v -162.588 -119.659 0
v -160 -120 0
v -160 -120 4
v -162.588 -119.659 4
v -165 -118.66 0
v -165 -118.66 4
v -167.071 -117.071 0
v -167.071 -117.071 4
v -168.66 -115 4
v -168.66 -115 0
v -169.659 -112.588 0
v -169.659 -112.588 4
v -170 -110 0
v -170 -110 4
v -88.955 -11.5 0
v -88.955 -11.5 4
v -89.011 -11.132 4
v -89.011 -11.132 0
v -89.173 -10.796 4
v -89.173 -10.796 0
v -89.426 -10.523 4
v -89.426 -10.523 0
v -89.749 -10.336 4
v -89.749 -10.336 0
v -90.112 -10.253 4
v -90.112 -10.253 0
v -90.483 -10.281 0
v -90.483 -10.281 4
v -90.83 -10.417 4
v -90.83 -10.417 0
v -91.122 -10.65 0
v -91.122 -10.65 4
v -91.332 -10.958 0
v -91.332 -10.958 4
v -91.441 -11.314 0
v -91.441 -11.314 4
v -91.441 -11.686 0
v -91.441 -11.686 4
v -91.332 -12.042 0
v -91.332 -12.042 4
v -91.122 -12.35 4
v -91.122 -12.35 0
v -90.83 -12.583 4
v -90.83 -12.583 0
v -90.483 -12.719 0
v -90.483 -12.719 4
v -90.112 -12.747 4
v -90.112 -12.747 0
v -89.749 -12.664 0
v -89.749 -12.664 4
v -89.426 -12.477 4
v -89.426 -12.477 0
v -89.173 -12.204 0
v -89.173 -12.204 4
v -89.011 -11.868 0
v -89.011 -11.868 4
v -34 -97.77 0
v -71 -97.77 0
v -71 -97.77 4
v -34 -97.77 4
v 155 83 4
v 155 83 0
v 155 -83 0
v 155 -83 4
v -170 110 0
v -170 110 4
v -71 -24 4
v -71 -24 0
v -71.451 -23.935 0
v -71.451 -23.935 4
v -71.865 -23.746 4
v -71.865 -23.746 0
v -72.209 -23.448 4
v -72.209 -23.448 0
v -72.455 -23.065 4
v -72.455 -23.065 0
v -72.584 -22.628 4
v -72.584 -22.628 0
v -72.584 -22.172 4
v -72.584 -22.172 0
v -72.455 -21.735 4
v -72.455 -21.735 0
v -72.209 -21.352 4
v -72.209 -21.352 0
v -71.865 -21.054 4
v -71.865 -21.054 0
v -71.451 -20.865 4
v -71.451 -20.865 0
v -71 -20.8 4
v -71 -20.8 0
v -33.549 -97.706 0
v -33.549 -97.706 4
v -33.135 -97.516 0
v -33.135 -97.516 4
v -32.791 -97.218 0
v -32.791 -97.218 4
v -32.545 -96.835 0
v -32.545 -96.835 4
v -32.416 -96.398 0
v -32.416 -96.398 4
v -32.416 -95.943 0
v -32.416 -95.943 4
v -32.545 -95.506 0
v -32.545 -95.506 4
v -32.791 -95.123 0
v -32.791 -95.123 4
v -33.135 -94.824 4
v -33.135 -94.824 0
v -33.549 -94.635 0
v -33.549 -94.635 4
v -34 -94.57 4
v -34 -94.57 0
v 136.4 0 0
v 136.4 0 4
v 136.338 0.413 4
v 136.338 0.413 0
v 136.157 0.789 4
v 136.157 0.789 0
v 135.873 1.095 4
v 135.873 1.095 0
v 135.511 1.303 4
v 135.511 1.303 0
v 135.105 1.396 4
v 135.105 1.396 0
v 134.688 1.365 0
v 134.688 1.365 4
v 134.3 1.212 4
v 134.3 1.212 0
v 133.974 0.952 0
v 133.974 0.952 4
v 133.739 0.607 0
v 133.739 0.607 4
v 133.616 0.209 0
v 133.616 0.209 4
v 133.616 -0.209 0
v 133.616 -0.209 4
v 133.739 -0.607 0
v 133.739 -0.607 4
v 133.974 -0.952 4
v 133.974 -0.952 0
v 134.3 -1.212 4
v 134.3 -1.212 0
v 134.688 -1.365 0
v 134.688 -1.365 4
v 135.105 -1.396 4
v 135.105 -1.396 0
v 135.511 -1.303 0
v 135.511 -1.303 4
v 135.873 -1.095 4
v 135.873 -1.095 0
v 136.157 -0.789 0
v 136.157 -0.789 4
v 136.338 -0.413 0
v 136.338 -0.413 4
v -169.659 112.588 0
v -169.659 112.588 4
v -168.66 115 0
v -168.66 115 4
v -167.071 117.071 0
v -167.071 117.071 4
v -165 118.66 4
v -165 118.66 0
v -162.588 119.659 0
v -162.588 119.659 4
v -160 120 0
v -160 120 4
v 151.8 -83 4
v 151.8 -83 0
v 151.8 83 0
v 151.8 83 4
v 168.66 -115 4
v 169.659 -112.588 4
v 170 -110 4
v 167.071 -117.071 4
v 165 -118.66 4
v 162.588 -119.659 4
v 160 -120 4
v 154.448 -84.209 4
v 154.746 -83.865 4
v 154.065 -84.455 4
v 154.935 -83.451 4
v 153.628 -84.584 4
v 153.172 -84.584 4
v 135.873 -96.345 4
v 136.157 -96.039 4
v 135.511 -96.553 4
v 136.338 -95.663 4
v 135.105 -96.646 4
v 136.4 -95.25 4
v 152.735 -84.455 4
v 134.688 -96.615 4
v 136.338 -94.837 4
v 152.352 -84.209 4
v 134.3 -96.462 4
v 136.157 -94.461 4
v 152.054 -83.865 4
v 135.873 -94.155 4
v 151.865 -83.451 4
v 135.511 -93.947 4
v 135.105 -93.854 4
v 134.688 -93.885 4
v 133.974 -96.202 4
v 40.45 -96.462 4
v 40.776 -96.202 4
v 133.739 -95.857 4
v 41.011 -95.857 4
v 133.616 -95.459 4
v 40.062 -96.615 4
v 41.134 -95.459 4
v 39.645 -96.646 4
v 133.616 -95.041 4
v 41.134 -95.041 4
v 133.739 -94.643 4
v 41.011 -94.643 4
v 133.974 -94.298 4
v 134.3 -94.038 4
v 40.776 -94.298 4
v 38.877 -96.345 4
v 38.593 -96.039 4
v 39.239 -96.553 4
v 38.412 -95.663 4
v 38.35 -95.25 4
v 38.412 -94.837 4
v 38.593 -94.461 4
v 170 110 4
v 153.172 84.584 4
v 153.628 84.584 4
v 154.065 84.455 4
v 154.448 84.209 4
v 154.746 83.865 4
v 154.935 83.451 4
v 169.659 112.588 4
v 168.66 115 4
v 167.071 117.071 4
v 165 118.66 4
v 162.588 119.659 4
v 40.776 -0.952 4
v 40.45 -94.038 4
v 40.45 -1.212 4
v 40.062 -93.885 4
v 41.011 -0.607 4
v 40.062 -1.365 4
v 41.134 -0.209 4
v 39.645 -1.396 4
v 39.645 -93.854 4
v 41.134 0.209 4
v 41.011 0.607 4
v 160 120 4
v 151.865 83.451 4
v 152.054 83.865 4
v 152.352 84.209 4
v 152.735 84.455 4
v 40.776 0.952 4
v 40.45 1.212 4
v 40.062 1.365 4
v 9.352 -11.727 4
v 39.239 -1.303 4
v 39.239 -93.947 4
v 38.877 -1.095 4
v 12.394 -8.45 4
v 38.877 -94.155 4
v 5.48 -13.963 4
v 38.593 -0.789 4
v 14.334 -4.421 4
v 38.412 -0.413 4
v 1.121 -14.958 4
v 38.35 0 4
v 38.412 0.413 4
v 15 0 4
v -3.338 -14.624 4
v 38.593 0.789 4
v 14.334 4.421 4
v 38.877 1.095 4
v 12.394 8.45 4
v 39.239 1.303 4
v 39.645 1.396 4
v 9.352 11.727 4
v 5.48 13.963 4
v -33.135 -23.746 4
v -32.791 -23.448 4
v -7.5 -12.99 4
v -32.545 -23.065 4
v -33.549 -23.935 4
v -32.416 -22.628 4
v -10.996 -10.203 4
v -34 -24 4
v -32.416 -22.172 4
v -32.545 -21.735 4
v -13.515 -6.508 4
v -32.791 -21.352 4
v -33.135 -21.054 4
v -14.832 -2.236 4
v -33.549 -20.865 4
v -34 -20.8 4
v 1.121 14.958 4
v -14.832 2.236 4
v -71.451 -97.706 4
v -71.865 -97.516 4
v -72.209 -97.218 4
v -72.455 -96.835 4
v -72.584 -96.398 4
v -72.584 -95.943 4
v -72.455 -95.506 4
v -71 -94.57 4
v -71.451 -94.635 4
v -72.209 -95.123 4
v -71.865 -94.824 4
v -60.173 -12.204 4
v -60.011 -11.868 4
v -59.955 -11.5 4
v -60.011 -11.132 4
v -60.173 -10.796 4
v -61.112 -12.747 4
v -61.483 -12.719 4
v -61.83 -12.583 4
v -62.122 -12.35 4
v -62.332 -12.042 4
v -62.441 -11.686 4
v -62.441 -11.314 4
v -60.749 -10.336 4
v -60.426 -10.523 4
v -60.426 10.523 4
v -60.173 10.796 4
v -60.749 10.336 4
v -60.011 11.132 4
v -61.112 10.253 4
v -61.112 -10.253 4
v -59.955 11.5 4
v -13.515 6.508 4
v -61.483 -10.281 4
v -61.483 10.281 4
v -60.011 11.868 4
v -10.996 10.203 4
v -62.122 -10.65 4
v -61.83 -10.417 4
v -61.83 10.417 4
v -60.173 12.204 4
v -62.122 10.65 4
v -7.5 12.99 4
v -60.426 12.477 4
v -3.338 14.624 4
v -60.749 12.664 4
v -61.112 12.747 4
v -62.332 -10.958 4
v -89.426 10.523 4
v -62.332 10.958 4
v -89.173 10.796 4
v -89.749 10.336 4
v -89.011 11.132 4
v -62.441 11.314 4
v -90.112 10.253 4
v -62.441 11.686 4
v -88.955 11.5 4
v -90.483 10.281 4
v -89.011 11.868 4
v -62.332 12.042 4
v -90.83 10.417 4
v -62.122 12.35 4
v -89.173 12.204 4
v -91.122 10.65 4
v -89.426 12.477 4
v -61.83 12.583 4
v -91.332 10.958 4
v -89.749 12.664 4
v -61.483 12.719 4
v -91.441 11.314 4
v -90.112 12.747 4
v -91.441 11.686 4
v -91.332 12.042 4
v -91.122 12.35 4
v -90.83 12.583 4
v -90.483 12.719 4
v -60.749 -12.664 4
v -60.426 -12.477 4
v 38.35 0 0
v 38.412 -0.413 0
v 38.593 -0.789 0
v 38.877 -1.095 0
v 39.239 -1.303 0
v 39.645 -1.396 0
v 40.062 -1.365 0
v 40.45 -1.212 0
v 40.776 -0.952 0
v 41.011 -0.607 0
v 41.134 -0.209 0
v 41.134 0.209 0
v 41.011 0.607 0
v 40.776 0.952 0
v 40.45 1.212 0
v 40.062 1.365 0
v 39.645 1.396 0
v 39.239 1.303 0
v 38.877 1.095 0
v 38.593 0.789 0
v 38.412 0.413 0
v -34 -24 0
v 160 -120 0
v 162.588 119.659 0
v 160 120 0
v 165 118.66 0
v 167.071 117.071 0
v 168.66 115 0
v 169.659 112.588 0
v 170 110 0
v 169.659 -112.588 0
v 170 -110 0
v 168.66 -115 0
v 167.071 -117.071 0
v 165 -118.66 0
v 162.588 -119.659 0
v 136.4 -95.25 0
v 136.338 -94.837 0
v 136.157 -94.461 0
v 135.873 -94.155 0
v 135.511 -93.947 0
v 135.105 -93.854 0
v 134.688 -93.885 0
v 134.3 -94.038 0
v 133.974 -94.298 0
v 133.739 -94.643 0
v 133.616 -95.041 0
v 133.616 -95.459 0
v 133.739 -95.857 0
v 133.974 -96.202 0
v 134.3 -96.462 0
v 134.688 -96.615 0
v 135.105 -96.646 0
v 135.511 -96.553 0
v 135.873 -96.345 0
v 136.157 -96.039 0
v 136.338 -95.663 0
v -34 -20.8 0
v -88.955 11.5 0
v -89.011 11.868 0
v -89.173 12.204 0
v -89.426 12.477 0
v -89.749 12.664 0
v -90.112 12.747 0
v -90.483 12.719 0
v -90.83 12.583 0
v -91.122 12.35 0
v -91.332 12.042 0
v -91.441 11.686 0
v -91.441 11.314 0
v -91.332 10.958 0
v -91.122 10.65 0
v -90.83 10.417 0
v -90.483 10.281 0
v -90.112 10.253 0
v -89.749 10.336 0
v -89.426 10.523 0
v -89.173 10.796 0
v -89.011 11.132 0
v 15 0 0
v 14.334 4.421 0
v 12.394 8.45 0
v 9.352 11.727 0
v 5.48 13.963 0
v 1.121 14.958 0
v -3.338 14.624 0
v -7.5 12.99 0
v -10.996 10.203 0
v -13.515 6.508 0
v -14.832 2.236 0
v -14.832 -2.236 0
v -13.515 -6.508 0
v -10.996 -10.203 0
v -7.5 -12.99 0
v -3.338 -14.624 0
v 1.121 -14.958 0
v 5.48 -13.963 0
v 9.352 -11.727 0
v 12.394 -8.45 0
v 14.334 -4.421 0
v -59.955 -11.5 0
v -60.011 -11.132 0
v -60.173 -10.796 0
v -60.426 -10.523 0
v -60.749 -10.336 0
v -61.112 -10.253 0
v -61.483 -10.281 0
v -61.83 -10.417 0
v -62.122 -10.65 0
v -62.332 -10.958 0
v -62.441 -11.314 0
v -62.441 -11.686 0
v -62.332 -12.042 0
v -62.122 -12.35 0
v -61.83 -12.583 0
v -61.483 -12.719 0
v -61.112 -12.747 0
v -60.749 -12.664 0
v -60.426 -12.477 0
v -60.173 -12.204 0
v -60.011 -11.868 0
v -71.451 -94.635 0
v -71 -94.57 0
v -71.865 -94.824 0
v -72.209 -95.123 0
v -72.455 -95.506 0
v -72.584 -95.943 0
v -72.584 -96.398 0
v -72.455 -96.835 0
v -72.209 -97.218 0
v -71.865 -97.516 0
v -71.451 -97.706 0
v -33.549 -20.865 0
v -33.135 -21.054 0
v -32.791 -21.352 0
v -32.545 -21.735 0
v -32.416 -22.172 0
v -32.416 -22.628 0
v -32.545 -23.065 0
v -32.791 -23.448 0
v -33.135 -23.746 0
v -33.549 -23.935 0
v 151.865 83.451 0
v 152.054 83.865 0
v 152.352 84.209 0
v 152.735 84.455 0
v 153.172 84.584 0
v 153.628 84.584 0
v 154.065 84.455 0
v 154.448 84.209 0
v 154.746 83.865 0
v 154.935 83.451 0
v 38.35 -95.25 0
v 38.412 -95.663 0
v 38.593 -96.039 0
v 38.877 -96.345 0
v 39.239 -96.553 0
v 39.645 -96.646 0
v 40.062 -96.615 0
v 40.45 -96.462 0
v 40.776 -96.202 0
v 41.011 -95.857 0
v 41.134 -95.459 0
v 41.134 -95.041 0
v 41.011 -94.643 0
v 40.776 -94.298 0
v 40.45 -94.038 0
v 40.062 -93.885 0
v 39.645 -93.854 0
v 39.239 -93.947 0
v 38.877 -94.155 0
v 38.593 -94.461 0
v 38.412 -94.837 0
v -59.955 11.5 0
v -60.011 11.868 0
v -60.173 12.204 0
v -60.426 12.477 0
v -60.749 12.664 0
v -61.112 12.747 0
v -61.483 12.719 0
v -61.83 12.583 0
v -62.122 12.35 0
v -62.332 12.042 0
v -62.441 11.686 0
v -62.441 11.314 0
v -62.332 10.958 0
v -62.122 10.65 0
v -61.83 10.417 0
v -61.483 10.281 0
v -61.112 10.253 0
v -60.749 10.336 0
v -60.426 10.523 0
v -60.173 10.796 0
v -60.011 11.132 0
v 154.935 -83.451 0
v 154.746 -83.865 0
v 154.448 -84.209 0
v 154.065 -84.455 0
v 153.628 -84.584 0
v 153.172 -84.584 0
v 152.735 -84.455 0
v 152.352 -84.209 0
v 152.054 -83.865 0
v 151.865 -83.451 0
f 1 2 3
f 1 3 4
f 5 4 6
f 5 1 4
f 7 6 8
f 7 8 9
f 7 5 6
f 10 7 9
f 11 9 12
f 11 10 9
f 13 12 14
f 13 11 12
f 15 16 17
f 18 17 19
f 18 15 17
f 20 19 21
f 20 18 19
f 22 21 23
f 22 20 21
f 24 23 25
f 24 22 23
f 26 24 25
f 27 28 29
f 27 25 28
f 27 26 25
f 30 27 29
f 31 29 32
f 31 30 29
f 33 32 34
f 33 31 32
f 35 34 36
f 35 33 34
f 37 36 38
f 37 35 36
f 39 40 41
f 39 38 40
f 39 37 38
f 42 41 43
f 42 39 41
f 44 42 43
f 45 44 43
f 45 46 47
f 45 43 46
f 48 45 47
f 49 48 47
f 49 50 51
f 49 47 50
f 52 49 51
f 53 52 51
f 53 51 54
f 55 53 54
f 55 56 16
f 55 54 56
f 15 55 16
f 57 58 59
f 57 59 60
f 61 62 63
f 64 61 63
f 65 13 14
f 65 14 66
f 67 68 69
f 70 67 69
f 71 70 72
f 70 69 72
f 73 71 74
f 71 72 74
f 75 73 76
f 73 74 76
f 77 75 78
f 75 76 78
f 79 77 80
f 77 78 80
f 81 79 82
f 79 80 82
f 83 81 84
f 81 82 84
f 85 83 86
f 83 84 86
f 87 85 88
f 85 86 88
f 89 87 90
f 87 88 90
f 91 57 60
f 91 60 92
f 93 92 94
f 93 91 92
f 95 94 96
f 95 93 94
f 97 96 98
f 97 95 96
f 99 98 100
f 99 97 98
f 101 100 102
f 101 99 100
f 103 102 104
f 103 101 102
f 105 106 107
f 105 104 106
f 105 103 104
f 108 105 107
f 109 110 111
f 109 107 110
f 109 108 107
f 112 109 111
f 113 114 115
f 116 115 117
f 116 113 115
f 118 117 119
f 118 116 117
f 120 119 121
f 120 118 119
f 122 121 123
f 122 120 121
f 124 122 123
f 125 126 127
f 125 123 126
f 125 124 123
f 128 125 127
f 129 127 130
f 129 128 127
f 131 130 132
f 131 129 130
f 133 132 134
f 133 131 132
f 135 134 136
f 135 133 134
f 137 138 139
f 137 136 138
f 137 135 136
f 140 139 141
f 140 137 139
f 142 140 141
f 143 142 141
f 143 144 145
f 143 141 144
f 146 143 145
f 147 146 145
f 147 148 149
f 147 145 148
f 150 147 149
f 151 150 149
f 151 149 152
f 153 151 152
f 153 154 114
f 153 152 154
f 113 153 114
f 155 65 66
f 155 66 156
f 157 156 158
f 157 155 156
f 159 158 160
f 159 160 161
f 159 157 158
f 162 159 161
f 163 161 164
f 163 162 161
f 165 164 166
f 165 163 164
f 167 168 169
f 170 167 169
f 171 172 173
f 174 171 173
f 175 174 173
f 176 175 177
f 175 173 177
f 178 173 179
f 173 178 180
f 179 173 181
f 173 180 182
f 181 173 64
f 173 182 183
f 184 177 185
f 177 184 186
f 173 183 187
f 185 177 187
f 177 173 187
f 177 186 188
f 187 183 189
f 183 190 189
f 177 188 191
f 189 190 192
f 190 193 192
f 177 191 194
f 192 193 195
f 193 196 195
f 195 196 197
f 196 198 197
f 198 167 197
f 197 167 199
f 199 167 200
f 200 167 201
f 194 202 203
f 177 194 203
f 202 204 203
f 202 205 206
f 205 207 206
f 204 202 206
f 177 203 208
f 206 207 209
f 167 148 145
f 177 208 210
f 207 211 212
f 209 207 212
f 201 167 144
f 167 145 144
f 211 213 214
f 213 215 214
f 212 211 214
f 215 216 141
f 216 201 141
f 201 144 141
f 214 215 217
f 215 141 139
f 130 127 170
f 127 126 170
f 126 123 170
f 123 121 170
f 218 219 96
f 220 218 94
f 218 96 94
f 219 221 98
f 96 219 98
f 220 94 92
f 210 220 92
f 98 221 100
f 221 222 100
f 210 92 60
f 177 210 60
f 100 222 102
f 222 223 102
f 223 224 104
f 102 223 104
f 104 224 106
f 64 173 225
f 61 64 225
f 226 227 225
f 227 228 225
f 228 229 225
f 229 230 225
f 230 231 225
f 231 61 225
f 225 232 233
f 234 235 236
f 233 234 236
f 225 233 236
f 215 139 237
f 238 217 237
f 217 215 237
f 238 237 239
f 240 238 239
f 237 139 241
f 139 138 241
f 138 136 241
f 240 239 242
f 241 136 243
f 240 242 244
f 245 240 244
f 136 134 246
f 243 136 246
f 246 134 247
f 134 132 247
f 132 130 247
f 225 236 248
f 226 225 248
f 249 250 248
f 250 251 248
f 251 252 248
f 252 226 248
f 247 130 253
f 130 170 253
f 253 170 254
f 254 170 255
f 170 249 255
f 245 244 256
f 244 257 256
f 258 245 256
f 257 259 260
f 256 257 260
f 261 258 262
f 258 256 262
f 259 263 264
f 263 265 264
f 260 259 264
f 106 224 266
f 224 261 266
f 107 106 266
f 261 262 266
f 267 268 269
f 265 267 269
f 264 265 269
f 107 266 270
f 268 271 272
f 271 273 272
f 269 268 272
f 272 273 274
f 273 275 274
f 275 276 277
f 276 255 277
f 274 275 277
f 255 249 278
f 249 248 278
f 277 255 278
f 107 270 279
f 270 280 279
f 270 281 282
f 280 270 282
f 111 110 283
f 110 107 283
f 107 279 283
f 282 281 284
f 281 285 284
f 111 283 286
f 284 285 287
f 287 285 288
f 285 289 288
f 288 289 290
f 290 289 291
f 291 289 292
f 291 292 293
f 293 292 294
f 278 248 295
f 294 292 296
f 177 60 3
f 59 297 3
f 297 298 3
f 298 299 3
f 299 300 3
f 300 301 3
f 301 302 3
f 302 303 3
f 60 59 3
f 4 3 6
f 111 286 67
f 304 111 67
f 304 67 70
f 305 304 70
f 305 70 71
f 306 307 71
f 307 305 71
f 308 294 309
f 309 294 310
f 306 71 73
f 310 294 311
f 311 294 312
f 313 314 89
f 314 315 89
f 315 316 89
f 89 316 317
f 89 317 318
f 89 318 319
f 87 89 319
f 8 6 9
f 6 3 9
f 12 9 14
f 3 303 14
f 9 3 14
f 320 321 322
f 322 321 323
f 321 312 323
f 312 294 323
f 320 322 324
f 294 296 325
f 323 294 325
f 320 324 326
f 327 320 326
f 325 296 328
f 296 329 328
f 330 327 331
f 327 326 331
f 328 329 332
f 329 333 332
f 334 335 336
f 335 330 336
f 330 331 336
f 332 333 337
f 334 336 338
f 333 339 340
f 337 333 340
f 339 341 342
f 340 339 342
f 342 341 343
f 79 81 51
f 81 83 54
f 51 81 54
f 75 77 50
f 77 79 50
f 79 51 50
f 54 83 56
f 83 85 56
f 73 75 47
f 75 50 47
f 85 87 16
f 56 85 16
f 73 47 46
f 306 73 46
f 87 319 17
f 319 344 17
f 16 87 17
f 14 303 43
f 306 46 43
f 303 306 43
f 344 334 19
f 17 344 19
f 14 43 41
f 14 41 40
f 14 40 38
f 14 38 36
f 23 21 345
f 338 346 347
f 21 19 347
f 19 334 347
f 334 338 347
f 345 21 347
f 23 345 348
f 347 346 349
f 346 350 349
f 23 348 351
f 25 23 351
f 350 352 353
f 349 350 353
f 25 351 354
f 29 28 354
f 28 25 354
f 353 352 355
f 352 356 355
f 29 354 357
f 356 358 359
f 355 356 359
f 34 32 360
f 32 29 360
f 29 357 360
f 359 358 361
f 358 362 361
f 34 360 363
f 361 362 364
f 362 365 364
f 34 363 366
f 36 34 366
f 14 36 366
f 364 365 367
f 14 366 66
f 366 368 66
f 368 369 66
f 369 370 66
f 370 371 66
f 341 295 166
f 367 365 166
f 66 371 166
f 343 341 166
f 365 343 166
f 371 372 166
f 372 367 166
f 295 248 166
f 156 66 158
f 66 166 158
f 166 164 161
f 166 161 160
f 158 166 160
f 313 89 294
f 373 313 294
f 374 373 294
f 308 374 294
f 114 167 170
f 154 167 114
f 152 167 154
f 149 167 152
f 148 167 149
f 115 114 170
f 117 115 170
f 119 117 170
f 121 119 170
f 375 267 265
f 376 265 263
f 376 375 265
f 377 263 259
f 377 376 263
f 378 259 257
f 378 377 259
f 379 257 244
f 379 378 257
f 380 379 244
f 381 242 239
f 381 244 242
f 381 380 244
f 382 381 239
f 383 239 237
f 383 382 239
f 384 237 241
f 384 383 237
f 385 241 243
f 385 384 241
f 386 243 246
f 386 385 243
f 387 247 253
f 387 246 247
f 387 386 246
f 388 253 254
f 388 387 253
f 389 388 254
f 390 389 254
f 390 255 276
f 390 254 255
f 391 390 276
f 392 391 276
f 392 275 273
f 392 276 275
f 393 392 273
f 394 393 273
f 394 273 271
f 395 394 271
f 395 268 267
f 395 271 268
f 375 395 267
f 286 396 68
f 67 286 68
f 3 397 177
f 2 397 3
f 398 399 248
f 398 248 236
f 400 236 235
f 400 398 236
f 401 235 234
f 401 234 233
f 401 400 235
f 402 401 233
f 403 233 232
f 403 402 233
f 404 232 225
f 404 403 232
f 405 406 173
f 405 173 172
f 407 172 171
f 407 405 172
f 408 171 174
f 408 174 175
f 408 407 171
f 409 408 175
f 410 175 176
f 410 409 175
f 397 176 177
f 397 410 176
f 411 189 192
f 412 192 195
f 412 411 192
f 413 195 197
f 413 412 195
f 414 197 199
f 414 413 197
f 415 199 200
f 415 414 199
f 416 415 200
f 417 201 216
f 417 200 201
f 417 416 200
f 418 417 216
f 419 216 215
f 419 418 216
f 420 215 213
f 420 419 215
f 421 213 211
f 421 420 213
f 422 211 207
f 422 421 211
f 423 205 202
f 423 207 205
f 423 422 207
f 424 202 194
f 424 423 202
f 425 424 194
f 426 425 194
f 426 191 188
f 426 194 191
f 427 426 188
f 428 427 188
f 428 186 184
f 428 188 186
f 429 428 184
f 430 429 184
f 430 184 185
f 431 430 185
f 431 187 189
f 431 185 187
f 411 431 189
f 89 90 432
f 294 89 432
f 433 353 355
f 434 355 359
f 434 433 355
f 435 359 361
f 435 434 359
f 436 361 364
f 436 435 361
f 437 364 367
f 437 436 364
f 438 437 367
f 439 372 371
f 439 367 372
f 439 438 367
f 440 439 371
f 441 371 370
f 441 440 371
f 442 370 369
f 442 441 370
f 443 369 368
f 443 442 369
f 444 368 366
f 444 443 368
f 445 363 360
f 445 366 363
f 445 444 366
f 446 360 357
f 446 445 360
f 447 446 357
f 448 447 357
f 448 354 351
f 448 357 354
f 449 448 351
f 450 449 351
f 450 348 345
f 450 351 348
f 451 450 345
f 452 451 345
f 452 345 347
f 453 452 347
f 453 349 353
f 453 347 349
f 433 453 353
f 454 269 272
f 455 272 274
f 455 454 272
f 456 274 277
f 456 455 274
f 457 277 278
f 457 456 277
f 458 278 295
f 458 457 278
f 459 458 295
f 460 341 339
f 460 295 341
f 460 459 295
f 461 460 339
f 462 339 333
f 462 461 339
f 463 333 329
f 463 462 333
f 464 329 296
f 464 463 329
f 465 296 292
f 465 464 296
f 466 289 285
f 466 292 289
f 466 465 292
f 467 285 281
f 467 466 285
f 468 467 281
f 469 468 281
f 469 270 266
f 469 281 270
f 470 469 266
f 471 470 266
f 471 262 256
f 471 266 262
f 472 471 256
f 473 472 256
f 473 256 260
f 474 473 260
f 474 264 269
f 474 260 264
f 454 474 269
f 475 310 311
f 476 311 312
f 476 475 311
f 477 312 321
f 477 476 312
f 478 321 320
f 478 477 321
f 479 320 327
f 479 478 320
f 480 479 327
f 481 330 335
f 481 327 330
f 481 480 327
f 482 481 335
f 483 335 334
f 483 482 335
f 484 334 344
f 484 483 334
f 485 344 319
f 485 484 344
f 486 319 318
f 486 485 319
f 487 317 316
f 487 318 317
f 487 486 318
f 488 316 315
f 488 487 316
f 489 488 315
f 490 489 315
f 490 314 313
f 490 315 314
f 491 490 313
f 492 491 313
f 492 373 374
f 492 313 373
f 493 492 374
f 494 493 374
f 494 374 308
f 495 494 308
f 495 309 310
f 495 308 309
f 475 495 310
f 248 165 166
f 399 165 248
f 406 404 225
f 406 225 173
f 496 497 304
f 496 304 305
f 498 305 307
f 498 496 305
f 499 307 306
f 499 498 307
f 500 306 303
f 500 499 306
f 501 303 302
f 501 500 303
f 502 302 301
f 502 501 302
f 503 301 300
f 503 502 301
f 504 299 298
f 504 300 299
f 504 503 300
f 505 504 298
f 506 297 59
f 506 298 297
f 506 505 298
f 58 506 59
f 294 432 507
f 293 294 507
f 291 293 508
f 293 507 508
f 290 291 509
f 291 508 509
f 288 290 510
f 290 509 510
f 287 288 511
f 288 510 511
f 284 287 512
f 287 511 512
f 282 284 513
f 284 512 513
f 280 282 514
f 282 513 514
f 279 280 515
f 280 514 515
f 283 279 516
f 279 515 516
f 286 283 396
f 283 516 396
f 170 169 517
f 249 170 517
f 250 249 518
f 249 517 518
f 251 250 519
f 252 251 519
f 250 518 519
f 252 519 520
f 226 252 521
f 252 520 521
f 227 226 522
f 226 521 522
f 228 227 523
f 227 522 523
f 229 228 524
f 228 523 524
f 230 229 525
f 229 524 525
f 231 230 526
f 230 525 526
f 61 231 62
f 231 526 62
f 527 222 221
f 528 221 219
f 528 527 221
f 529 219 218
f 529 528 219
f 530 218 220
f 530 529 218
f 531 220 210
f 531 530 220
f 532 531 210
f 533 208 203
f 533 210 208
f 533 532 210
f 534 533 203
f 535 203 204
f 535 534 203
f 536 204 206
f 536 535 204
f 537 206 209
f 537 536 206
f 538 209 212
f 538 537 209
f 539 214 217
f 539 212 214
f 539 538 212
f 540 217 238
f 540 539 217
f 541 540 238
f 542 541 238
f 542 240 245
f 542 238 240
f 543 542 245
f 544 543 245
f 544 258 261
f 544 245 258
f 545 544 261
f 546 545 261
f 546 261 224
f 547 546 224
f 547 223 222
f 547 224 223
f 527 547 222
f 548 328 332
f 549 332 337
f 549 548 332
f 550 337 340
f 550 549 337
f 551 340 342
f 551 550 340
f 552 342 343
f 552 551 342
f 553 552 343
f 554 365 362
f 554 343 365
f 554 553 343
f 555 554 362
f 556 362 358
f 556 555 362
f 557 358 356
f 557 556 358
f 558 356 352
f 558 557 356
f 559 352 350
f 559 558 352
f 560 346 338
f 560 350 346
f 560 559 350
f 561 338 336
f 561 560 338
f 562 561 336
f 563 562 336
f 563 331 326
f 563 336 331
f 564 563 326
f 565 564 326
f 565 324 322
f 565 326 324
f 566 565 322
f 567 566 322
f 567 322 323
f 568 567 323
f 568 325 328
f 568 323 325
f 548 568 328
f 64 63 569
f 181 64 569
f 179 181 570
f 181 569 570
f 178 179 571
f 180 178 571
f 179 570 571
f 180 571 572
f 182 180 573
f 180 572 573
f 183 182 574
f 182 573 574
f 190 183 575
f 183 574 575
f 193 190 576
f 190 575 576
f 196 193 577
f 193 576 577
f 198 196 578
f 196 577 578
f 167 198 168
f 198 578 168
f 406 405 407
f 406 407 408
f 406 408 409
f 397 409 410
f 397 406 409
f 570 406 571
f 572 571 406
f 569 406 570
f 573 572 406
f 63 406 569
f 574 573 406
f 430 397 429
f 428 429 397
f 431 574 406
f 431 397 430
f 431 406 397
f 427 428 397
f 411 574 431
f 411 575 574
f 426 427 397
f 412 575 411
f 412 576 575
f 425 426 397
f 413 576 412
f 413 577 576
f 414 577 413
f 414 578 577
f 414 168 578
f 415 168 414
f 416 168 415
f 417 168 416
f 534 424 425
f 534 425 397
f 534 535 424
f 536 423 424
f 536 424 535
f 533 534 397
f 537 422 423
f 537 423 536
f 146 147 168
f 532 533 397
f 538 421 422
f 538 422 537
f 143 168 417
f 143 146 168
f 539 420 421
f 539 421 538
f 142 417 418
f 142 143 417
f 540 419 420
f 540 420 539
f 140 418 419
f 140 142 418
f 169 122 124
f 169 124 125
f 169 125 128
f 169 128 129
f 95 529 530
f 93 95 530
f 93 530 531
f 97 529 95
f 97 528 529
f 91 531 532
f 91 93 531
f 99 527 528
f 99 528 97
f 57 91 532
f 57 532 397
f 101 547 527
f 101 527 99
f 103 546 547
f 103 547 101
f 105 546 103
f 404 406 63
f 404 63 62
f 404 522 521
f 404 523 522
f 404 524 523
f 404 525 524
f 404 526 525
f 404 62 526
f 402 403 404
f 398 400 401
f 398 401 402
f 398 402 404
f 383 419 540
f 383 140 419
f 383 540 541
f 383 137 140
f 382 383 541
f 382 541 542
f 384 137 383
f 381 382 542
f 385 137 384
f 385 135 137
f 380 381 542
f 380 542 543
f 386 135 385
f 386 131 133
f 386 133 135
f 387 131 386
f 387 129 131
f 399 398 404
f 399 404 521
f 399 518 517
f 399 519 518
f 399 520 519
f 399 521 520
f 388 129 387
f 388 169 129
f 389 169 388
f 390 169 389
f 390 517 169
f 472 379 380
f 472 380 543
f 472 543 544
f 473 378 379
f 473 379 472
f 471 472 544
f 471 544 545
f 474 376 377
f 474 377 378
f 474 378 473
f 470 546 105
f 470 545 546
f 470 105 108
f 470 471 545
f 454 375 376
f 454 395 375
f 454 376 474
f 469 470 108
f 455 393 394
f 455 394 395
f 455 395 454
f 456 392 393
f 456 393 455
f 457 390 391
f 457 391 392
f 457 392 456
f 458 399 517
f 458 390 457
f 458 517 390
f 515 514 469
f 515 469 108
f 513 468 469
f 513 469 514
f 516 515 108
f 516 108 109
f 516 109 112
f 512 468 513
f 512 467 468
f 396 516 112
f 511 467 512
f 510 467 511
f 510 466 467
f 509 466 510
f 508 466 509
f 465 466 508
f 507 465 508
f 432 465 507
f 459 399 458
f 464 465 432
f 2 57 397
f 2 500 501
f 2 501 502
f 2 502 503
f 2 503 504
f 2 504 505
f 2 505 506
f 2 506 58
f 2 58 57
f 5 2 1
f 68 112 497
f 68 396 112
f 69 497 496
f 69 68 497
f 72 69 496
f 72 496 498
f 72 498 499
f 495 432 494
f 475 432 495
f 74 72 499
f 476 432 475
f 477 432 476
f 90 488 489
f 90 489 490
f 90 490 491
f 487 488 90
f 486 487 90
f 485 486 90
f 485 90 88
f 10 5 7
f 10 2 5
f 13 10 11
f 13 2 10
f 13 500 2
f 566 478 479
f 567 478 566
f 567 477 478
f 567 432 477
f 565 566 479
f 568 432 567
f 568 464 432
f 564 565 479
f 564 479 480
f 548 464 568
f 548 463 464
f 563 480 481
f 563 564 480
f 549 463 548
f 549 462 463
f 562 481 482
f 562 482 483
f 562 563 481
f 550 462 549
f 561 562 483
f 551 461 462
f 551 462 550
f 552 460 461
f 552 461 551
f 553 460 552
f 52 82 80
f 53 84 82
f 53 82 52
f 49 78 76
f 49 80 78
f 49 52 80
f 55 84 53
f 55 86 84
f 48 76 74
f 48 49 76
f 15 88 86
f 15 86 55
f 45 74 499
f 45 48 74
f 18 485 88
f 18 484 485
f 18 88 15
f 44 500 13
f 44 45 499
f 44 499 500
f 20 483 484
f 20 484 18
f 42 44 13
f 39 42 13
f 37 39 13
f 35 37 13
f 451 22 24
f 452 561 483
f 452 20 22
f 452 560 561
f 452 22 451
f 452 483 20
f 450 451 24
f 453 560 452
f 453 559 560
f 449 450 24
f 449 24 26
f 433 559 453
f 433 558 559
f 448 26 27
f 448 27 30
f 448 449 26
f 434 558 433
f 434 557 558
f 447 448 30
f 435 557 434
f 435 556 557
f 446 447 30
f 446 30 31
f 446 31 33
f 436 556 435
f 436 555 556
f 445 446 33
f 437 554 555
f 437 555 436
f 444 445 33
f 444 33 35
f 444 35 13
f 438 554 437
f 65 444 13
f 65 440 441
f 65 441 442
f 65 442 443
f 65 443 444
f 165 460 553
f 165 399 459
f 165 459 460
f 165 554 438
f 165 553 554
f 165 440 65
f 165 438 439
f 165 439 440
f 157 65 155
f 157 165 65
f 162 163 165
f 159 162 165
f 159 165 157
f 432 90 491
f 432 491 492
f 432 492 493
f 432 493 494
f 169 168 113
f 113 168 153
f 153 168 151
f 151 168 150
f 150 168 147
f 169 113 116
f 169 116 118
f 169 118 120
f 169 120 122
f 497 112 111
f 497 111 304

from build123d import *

# Parameters (mm, degrees)
EXTRUDE_1_DEPTH             = 4
SKETCH_1_4_R                = 1.25
CUT_EXTRUDE_4_DEPTH         = 10
PATTERN_LINEAR_1_COUNT      = 2
PATTERN_LINEAR_1_PITCH      = 29
PATTERN_LINEAR_1_COUNT_DIR2 = 2
PATTERN_LINEAR_1_PITCH_DIR2 = 23
CUT_EXTRUDE_6_DEPTH         = 19
SKETCH_1_7_R                = 1.4
CUT_EXTRUDE_8_DEPTH         = 9
CUT_EXTRUDE_10_DEPTH        = 9
SKETCH_1_8_R                = 15
CUT_EXTRUDE_12_DEPTH        = 9


with BuildPart() as part:
    # 草图1 → 凸台-拉伸1 (new body)
    with BuildSketch(Plane.XY):
        with BuildLine():
            Line((160, -120), (-160, -120))
            ThreePointArc((-160, -120), (-167.071067812, -117.071067812), (-170, -110))
            Line((-170, -110), (-170, 110))
            ThreePointArc((-170, 110), (-167.071067812, 117.071067812), (-160, 120))
            Line((-160, 120), (160, 120))
            ThreePointArc((160, 120), (167.071067812, 117.071067812), (170, 110))
            Line((170, 110), (170, -110))
            ThreePointArc((170, -110), (167.071067812, -117.071067812), (160, -120))
        make_face()
    extrude(amount=EXTRUDE_1_DEPTH)

    # 草图1<4> → 切除-拉伸4 (cut)
    with BuildSketch(Plane.XY):
        with Locations((-90.205317251, 11.5)):
            Circle(SKETCH_1_4_R)
    cut_extrude_4 = extrude(amount=CUT_EXTRUDE_4_DEPTH, mode=Mode.SUBTRACT)

    # 阵列(线性)1: Cut-Extrude 4 2 × 2
    with Locations(*[(i * PATTERN_LINEAR_1_PITCH, -j * PATTERN_LINEAR_1_PITCH_DIR2, 0) for i in range(PATTERN_LINEAR_1_COUNT) for j in range(PATTERN_LINEAR_1_COUNT_DIR2) if (i, j) != (0, 0)]):
        add(cut_extrude_4, mode=Mode.SUBTRACT)

    # 草图1<6> → 切除-拉伸6 (cut)
    with BuildSketch(Plane.XY):
        with BuildLine():
            Line((151.8, -83), (151.8, 83))
            ThreePointArc((151.8, 83), (153.4, 84.600001349), (155, 83))
            Line((155, 83), (155, -83))
            ThreePointArc((155, -83), (153.4, -84.600001349), (151.8, -83))
        make_face()
    extrude(amount=CUT_EXTRUDE_6_DEPTH, mode=Mode.SUBTRACT)

    # 草图1<7> → 切除-拉伸8 (cut)
    with BuildSketch(Plane.XY):
        with Locations((135, -95.25)):
            Circle(SKETCH_1_7_R)
        with Locations((39.75, -95.25)):
            Circle(SKETCH_1_7_R)
        with Locations((135, 0)):
            Circle(SKETCH_1_7_R)
        with Locations((39.75, 0)):
            Circle(SKETCH_1_7_R)
    extrude(amount=CUT_EXTRUDE_8_DEPTH, mode=Mode.SUBTRACT)

    # 草图3 → 切除-拉伸10 (cut)
    with BuildSketch(Plane.XY):
        with BuildLine():
            Line((-34, -24), (-71, -24))
            ThreePointArc((-71, -24), (-72.6, -22.4), (-71, -20.8))
            Line((-71, -20.8), (-34, -20.8))
            ThreePointArc((-34, -20.8), (-32.4, -22.4), (-34, -24))
        make_face()
        with BuildLine():
            Line((-34, -94.570317046), (-71, -94.570317046))
            ThreePointArc((-71, -94.570317046), (-72.6, -96.170317046), (-71, -97.770317046))
            Line((-71, -97.770317046), (-34, -97.770317046))
            ThreePointArc((-34, -97.770317046), (-32.4, -96.170317046), (-34, -94.570317046))
        make_face()
    extrude(amount=CUT_EXTRUDE_10_DEPTH, mode=Mode.SUBTRACT)

    # 草图1<8> → 切除-拉伸12 (cut)
    with BuildSketch(Plane.XY):
        Circle(SKETCH_1_8_R)
    extrude(amount=CUT_EXTRUDE_12_DEPTH, mode=Mode.SUBTRACT)


solid = part.part
